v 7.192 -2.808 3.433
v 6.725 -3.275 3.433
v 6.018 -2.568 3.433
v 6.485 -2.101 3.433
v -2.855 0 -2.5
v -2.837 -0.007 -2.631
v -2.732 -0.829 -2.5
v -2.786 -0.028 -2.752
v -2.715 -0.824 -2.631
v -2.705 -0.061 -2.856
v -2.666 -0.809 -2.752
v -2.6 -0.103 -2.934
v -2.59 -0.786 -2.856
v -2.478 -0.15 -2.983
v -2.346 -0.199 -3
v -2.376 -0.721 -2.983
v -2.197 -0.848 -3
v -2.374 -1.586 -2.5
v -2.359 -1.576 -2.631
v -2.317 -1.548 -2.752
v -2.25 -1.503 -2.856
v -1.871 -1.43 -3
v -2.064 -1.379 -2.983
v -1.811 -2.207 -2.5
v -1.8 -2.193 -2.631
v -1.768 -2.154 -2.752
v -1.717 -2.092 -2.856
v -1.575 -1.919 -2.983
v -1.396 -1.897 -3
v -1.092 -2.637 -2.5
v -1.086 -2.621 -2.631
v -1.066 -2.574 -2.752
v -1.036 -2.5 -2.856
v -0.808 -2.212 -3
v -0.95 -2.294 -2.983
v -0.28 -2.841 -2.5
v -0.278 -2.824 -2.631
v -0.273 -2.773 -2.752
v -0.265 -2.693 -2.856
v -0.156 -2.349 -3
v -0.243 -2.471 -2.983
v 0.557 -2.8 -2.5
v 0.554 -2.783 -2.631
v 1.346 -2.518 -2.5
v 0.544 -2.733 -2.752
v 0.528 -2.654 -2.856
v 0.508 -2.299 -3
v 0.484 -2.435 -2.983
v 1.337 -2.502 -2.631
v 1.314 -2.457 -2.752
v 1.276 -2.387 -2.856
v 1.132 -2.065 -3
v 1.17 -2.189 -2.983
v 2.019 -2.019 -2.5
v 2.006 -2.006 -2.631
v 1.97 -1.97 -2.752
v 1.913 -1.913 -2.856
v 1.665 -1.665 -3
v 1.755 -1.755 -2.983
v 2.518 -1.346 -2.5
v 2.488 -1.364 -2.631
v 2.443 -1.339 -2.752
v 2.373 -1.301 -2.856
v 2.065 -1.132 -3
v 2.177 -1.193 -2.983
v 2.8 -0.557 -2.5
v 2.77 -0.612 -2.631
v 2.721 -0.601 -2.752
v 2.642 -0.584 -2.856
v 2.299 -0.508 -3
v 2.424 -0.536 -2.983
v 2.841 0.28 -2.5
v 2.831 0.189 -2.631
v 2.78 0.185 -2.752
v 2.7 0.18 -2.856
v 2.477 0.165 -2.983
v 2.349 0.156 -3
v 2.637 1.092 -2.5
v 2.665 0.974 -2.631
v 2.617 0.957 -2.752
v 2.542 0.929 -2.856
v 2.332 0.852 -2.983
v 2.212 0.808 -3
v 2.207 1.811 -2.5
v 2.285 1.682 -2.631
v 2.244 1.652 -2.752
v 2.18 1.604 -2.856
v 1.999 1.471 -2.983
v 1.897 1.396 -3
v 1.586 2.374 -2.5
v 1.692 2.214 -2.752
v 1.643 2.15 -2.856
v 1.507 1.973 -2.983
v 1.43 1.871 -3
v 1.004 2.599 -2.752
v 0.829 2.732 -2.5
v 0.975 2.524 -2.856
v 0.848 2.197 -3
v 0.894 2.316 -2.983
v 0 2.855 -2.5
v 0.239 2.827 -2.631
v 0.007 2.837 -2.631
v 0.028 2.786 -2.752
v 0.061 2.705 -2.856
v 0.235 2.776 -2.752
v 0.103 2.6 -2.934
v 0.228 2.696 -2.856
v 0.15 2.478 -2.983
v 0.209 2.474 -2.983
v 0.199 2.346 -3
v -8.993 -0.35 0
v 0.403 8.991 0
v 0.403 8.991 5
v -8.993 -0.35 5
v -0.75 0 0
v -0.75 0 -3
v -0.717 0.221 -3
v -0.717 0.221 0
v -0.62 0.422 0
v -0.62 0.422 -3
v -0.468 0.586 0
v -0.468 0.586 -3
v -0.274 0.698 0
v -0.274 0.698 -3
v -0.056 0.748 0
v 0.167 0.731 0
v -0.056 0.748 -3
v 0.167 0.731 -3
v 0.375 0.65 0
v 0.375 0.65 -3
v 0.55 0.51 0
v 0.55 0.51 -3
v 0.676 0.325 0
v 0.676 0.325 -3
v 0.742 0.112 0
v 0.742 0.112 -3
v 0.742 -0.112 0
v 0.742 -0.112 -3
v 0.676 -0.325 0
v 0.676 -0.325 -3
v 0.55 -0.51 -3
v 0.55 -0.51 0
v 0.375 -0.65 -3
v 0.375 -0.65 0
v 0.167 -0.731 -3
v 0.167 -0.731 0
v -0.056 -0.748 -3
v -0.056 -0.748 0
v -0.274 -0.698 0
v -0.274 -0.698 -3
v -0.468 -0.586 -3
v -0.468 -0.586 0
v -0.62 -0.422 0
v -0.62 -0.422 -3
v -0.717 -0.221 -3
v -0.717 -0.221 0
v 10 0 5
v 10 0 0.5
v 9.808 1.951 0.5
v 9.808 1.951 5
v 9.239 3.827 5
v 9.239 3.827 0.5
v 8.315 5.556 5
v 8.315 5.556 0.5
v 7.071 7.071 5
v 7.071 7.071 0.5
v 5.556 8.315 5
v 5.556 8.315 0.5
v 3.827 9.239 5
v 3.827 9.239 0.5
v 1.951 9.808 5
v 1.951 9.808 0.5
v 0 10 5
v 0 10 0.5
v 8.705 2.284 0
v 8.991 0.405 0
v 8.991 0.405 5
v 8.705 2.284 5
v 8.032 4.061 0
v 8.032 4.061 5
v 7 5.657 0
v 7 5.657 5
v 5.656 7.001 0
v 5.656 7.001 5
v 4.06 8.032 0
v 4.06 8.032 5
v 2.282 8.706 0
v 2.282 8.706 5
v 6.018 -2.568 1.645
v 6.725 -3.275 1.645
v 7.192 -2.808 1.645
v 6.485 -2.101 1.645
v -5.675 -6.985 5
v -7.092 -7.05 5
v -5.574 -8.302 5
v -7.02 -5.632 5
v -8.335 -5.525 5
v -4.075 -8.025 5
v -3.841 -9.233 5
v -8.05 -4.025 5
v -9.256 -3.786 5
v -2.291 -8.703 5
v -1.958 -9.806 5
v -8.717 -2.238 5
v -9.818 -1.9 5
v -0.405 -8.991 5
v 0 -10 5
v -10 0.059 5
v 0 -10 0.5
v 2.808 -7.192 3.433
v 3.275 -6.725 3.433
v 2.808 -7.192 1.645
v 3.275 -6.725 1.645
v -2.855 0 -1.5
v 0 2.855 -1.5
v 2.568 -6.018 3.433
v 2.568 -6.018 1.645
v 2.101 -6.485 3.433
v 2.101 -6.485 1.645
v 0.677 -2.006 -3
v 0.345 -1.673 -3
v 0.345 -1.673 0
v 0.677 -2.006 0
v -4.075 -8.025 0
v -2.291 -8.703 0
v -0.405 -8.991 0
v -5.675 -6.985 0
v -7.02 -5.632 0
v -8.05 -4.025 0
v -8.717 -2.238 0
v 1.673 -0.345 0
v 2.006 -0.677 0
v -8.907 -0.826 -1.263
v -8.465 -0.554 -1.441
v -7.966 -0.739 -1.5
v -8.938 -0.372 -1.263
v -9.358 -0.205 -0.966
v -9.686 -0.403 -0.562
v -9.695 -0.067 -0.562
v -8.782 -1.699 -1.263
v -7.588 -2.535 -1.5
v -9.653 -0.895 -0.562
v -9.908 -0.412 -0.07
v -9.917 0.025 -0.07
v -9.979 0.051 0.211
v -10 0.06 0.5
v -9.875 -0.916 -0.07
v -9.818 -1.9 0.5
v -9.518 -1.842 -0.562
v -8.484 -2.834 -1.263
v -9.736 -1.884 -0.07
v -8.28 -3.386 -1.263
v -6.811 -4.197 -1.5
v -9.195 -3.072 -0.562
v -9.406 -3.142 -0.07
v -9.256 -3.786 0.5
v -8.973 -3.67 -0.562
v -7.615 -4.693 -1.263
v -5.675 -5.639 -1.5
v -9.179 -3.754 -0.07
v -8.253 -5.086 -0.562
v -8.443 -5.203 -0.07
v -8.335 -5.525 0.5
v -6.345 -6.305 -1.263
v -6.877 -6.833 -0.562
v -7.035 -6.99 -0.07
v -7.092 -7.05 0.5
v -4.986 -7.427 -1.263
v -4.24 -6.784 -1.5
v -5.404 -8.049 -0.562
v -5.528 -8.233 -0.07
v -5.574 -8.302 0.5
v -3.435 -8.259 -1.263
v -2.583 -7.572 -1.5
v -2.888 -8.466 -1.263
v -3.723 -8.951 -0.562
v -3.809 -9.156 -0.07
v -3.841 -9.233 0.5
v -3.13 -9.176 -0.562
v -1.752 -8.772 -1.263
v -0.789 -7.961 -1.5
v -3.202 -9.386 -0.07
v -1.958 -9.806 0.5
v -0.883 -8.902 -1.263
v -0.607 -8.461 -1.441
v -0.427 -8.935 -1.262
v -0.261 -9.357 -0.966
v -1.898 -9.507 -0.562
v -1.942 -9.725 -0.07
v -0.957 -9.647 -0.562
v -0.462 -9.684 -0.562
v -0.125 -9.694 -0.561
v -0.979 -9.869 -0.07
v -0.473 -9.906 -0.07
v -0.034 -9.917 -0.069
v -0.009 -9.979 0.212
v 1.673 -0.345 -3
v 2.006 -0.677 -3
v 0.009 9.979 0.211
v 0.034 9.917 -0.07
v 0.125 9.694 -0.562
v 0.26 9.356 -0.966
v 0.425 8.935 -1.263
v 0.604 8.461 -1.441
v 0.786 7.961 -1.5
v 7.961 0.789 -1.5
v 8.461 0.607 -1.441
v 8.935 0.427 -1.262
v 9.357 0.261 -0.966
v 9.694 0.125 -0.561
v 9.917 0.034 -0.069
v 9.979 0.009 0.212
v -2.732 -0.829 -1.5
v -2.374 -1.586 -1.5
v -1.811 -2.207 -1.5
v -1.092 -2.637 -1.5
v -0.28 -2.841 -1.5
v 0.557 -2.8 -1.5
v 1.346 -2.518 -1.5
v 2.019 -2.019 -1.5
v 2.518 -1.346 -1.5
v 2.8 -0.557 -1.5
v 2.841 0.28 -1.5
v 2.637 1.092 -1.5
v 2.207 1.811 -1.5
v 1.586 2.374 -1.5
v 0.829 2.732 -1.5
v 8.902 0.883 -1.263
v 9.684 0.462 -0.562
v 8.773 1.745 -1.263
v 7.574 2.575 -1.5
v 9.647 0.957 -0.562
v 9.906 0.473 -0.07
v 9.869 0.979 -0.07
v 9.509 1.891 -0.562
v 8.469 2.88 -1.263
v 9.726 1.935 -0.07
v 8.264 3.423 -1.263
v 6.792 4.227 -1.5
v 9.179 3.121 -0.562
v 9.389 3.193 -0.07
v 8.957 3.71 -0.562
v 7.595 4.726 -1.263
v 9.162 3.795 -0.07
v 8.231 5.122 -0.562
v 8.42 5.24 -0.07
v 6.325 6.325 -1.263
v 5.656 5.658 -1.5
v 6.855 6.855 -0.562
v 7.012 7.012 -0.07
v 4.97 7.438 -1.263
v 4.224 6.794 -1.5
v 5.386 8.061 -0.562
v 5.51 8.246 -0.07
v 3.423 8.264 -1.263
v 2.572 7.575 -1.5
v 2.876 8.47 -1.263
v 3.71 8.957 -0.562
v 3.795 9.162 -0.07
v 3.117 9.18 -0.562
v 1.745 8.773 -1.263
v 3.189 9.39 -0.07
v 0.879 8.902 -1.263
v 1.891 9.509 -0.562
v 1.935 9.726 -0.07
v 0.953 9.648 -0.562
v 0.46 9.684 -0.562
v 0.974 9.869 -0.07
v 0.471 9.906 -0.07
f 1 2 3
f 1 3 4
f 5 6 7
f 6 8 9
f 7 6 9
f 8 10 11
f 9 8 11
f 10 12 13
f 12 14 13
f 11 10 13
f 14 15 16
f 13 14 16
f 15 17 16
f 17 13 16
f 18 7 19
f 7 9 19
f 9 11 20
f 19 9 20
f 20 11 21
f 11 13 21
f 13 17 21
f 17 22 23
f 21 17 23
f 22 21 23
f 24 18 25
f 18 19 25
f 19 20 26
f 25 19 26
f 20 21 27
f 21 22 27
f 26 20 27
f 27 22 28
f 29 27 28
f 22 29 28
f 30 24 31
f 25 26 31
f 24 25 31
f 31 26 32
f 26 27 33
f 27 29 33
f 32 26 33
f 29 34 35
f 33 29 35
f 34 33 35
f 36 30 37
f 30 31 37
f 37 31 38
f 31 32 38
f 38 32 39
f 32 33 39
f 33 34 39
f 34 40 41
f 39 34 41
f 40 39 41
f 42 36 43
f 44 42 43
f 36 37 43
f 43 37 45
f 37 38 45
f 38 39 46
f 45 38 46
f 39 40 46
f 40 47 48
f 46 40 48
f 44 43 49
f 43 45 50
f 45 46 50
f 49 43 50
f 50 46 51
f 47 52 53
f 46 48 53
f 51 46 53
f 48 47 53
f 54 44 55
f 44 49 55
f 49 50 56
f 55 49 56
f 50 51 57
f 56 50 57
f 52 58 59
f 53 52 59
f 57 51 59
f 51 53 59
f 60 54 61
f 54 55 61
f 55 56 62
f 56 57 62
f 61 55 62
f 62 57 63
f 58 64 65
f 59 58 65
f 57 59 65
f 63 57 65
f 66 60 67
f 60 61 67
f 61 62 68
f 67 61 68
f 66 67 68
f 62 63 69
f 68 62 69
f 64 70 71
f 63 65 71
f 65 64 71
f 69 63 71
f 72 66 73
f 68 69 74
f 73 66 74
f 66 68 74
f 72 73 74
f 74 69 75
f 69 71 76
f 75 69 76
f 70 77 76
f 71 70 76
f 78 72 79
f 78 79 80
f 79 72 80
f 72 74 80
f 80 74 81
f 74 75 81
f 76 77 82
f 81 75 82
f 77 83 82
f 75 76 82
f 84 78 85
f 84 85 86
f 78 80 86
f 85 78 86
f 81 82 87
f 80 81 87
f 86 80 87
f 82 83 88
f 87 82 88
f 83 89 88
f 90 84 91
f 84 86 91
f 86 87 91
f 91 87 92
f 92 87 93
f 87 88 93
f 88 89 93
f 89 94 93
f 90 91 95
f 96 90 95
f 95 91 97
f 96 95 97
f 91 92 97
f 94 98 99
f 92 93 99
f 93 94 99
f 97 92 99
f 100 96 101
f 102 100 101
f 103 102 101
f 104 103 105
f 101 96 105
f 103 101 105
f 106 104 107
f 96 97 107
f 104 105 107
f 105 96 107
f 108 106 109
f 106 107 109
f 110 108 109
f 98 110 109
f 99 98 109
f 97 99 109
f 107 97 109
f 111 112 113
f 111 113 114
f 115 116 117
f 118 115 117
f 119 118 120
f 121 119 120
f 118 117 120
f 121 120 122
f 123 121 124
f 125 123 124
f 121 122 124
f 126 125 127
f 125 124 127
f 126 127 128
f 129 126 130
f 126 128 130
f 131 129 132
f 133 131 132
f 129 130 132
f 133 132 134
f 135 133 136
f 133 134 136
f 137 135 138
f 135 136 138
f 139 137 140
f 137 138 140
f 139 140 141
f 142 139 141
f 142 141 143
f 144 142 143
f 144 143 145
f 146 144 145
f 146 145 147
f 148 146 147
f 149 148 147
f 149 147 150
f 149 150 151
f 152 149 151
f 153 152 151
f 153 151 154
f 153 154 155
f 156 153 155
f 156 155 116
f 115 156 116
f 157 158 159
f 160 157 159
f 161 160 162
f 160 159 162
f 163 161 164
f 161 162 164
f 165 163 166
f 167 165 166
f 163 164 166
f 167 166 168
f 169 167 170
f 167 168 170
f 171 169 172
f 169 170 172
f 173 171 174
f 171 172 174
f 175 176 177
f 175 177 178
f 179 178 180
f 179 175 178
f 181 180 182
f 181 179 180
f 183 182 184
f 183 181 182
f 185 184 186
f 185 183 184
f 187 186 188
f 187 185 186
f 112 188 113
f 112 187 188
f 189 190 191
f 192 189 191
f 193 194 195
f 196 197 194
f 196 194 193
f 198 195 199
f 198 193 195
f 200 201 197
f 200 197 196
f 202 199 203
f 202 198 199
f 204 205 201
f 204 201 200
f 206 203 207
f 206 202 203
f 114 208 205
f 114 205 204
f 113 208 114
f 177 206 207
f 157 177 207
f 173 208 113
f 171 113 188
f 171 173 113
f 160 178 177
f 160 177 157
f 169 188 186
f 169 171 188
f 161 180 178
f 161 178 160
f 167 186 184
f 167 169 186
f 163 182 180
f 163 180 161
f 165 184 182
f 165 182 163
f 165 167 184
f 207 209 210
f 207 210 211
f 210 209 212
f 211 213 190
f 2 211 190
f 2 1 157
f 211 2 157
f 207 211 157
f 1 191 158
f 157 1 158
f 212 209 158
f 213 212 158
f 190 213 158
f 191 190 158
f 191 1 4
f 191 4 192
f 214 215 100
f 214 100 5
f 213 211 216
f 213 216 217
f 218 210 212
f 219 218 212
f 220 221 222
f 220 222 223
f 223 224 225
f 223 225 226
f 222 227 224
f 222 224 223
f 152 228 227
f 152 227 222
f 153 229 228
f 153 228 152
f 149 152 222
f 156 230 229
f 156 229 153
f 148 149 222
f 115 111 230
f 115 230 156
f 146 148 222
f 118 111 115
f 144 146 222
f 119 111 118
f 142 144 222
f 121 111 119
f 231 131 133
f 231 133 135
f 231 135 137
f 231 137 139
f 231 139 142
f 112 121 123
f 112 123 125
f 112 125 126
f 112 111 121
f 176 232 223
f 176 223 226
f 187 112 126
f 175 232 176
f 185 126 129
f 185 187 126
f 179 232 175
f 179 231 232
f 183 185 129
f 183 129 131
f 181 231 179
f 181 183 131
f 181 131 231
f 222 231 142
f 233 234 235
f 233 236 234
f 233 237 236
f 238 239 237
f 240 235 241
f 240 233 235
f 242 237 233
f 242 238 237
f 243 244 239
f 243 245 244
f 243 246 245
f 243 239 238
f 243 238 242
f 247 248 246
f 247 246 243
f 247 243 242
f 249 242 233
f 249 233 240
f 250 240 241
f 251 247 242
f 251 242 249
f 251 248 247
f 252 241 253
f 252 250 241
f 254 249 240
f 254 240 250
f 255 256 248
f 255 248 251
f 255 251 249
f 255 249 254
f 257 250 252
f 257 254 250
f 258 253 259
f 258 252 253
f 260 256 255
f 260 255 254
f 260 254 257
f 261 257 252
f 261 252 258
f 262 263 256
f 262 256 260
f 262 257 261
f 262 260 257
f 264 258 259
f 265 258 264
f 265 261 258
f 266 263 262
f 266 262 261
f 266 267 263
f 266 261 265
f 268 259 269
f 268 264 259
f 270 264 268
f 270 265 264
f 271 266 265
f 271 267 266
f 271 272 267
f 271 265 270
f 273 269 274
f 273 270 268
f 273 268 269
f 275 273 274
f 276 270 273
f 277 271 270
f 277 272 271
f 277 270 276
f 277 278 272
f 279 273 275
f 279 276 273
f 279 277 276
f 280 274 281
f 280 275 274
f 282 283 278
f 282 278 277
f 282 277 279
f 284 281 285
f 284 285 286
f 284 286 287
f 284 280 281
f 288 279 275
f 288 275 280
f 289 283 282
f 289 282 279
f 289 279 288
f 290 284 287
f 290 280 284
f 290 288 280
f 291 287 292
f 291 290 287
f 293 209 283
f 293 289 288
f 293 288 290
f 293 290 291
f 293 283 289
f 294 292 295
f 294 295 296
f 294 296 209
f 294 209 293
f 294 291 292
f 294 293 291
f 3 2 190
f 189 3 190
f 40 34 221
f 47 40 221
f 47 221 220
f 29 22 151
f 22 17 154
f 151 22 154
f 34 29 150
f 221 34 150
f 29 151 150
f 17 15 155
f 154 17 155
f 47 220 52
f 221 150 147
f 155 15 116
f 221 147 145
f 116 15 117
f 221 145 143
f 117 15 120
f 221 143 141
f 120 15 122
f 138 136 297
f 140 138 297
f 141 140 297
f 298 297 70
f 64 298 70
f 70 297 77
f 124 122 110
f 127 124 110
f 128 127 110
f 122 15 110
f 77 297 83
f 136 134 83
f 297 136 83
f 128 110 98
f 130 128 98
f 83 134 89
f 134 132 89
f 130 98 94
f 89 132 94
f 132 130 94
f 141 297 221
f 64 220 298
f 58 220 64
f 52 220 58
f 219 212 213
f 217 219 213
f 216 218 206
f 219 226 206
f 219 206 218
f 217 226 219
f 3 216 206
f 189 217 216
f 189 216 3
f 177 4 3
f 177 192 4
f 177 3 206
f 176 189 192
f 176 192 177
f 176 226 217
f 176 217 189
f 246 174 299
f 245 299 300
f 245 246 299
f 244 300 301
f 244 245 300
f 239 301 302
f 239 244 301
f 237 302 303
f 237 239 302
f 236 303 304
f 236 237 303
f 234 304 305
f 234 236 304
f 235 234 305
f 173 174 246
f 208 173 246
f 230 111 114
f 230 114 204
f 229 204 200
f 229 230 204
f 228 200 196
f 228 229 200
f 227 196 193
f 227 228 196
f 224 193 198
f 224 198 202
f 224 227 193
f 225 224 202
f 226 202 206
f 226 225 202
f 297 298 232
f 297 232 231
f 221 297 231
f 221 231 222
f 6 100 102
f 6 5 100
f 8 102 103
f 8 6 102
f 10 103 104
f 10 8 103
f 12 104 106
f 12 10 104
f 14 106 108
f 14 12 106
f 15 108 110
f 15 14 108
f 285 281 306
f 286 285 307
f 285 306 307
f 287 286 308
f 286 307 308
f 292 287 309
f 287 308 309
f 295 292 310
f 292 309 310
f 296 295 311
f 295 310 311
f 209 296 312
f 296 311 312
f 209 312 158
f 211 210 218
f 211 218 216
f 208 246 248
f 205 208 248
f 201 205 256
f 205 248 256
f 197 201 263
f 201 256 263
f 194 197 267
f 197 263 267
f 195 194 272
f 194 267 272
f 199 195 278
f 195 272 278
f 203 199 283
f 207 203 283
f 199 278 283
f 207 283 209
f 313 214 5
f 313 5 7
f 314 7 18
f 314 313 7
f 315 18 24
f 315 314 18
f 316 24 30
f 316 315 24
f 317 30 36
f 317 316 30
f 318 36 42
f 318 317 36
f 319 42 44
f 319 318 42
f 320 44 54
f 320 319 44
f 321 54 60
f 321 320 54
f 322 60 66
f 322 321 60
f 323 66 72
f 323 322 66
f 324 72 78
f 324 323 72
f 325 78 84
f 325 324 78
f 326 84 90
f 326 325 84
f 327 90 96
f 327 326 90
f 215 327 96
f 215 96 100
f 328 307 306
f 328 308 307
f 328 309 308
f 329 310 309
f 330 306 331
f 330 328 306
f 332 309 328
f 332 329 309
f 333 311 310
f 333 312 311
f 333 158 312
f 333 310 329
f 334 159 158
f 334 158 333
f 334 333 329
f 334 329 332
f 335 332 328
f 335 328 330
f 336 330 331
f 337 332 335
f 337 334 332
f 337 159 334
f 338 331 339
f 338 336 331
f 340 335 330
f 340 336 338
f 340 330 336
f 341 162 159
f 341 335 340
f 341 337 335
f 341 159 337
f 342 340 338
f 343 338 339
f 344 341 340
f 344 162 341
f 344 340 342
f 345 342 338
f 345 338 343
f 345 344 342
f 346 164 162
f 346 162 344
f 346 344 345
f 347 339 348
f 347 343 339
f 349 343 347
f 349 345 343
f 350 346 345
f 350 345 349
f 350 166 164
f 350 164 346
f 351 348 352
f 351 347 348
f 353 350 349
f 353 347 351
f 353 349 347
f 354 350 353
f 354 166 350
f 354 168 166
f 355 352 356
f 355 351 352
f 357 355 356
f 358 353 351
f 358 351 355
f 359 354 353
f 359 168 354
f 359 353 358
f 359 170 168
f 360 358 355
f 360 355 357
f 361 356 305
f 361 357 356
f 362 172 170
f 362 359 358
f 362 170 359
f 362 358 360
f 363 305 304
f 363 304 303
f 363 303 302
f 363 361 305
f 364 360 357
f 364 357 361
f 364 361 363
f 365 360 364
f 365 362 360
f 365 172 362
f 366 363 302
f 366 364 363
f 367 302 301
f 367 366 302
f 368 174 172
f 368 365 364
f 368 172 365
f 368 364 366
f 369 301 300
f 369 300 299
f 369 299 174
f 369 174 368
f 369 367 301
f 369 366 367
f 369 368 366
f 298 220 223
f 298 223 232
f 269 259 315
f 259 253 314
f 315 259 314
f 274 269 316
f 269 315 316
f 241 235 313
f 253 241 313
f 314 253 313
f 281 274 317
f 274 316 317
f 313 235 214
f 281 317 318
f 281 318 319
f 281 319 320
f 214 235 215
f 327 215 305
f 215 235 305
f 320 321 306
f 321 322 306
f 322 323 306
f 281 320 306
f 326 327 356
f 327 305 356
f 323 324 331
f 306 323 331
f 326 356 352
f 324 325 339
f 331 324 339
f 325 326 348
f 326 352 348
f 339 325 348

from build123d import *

# Parameters (mm, degrees)
BOSS_EXTRUDE1_DEPTH = 5
BOSS_EXTRUDE2_START = 1.5
BOSS_EXTRUDE2_DEPTH = 1.5
FILLET1_R           = 2
BOSS_EXTRUDE3_DEPTH = 1.5
SKETCH4_R           = 0.75
CUT_EXTRUDE1_DEPTH  = 17.248076932
SKETCH5_W           = 1.787924943
SKETCH5_H           = 0.660460042
CUT_EXTRUDE2_DEPTH  = 1
FILLET2_R           = 0.5


with BuildPart() as part:
    # Sketch1 → Boss-Extrude1 (new body)
    with BuildSketch(Plane.XY):
        with BuildLine():
            Line((0, 10), (-9.999822986, 0.0595))
            ThreePointArc((-9.999822986, 0.0595), (-7.09207304, -7.05), (0, -10))
            Line((0, -10), (10, 0))
            ThreePointArc((10, 0), (7.071067812, 7.071067812), (0, 10))
        make_face()
        with BuildLine():
            Line((0.403373919, 8.990955983), (-8.993196905, -0.349870591))
            ThreePointArc((-8.993196905, -0.349870591), (-6.383472043, -6.344390016), (-0.405092287, -8.990878725))
            Line((-0.405092287, -8.990878725), (8.990878725, 0.405092287))
            ThreePointArc((8.990878725, 0.405092287), (6.363352853, 6.36456915), (0.403373919, 8.990955983))
        make_face(mode=Mode.SUBTRACT)
    extrude(amount=BOSS_EXTRUDE1_DEPTH)

    # Sketch2 → Boss-Extrude2 (add)
    with BuildSketch(Plane(origin=(0, 0, 0), x_dir=(-1, 0, 0), z_dir=(0, 0, -1)).offset(BOSS_EXTRUDE2_START)):
        with BuildLine():
            Line((0, 10), (9.999822986, 0.0595))
            ThreePointArc((9.999822986, 0.0595), (7.09207304, -7.05), (0, -10))
            Line((0, -10), (-10, 0))
            ThreePointArc((-10, 0), (-7.071067812, 7.071067812), (0, 10))
        make_face()
    extrude(amount=-BOSS_EXTRUDE2_DEPTH)

    # Fillet1
    fillet1_edges = [part.edges().sort_by_distance(p)[0] for p in [
        (7.071067812, 7.071067812, -1.5),
        (5, -5, -1.5),
        (-7.09207304, -7.05, -1.5),
        (-4.999911493, 5.02975, -1.5),
    ]]
    fillet(fillet1_edges, radius=FILLET1_R)

    # Sketch3 → Boss-Extrude3 (add)
    with BuildSketch(Plane(origin=(0, 0, -1.5), x_dir=(-1, 0, 0), z_dir=(0, 0, -1))):
        with BuildLine():
            Line((0, 2.854684063), (2.854684063, 0))
            ThreePointArc((2.854684063, 0), (-2.018566459, -2.018566459), (0, 2.854684063))
        make_face()
    extrude(amount=BOSS_EXTRUDE3_DEPTH)

    # Sketch4 → Cut-Extrude1 (cut, through all)
    with BuildSketch(Plane(origin=(0, 0, -3), x_dir=(-1, 0, 0), z_dir=(0, 0, -1))):
        Circle(SKETCH4_R)
        Polygon((-1.673451771, -0.345114688), (-0.345114688, -1.673451771), (-0.677198959, -2.005536042), (-2.005536042, -0.677198959), align=None)
    extrude(amount=-CUT_EXTRUDE1_DEPTH, mode=Mode.SUBTRACT)

    # Sketch5 → Cut-Extrude2 (cut)
    with BuildSketch(Plane(origin=(5, -5, 0), x_dir=(0, 0, -1), z_dir=(0.7071067811865477, -0.7071067811865475, 0))):
        with Locations((-2.538538979, -2.770235161)):
            Rectangle(SKETCH5_W, SKETCH5_H)
        with Locations((-2.538538979, 2.770235161)):
            Rectangle(SKETCH5_W, SKETCH5_H)
    extrude(amount=-CUT_EXTRUDE2_DEPTH, mode=Mode.SUBTRACT)

    # Fillet2
    fillet2_edges = [part.edges().sort_by_distance(p)[0] for p in [
        (2.018566459, -2.018566459, -3),
        (-1.427342031, 1.427342031, -3),
    ]]
    fillet(fillet2_edges, radius=FILLET2_R)


solid = part.part
